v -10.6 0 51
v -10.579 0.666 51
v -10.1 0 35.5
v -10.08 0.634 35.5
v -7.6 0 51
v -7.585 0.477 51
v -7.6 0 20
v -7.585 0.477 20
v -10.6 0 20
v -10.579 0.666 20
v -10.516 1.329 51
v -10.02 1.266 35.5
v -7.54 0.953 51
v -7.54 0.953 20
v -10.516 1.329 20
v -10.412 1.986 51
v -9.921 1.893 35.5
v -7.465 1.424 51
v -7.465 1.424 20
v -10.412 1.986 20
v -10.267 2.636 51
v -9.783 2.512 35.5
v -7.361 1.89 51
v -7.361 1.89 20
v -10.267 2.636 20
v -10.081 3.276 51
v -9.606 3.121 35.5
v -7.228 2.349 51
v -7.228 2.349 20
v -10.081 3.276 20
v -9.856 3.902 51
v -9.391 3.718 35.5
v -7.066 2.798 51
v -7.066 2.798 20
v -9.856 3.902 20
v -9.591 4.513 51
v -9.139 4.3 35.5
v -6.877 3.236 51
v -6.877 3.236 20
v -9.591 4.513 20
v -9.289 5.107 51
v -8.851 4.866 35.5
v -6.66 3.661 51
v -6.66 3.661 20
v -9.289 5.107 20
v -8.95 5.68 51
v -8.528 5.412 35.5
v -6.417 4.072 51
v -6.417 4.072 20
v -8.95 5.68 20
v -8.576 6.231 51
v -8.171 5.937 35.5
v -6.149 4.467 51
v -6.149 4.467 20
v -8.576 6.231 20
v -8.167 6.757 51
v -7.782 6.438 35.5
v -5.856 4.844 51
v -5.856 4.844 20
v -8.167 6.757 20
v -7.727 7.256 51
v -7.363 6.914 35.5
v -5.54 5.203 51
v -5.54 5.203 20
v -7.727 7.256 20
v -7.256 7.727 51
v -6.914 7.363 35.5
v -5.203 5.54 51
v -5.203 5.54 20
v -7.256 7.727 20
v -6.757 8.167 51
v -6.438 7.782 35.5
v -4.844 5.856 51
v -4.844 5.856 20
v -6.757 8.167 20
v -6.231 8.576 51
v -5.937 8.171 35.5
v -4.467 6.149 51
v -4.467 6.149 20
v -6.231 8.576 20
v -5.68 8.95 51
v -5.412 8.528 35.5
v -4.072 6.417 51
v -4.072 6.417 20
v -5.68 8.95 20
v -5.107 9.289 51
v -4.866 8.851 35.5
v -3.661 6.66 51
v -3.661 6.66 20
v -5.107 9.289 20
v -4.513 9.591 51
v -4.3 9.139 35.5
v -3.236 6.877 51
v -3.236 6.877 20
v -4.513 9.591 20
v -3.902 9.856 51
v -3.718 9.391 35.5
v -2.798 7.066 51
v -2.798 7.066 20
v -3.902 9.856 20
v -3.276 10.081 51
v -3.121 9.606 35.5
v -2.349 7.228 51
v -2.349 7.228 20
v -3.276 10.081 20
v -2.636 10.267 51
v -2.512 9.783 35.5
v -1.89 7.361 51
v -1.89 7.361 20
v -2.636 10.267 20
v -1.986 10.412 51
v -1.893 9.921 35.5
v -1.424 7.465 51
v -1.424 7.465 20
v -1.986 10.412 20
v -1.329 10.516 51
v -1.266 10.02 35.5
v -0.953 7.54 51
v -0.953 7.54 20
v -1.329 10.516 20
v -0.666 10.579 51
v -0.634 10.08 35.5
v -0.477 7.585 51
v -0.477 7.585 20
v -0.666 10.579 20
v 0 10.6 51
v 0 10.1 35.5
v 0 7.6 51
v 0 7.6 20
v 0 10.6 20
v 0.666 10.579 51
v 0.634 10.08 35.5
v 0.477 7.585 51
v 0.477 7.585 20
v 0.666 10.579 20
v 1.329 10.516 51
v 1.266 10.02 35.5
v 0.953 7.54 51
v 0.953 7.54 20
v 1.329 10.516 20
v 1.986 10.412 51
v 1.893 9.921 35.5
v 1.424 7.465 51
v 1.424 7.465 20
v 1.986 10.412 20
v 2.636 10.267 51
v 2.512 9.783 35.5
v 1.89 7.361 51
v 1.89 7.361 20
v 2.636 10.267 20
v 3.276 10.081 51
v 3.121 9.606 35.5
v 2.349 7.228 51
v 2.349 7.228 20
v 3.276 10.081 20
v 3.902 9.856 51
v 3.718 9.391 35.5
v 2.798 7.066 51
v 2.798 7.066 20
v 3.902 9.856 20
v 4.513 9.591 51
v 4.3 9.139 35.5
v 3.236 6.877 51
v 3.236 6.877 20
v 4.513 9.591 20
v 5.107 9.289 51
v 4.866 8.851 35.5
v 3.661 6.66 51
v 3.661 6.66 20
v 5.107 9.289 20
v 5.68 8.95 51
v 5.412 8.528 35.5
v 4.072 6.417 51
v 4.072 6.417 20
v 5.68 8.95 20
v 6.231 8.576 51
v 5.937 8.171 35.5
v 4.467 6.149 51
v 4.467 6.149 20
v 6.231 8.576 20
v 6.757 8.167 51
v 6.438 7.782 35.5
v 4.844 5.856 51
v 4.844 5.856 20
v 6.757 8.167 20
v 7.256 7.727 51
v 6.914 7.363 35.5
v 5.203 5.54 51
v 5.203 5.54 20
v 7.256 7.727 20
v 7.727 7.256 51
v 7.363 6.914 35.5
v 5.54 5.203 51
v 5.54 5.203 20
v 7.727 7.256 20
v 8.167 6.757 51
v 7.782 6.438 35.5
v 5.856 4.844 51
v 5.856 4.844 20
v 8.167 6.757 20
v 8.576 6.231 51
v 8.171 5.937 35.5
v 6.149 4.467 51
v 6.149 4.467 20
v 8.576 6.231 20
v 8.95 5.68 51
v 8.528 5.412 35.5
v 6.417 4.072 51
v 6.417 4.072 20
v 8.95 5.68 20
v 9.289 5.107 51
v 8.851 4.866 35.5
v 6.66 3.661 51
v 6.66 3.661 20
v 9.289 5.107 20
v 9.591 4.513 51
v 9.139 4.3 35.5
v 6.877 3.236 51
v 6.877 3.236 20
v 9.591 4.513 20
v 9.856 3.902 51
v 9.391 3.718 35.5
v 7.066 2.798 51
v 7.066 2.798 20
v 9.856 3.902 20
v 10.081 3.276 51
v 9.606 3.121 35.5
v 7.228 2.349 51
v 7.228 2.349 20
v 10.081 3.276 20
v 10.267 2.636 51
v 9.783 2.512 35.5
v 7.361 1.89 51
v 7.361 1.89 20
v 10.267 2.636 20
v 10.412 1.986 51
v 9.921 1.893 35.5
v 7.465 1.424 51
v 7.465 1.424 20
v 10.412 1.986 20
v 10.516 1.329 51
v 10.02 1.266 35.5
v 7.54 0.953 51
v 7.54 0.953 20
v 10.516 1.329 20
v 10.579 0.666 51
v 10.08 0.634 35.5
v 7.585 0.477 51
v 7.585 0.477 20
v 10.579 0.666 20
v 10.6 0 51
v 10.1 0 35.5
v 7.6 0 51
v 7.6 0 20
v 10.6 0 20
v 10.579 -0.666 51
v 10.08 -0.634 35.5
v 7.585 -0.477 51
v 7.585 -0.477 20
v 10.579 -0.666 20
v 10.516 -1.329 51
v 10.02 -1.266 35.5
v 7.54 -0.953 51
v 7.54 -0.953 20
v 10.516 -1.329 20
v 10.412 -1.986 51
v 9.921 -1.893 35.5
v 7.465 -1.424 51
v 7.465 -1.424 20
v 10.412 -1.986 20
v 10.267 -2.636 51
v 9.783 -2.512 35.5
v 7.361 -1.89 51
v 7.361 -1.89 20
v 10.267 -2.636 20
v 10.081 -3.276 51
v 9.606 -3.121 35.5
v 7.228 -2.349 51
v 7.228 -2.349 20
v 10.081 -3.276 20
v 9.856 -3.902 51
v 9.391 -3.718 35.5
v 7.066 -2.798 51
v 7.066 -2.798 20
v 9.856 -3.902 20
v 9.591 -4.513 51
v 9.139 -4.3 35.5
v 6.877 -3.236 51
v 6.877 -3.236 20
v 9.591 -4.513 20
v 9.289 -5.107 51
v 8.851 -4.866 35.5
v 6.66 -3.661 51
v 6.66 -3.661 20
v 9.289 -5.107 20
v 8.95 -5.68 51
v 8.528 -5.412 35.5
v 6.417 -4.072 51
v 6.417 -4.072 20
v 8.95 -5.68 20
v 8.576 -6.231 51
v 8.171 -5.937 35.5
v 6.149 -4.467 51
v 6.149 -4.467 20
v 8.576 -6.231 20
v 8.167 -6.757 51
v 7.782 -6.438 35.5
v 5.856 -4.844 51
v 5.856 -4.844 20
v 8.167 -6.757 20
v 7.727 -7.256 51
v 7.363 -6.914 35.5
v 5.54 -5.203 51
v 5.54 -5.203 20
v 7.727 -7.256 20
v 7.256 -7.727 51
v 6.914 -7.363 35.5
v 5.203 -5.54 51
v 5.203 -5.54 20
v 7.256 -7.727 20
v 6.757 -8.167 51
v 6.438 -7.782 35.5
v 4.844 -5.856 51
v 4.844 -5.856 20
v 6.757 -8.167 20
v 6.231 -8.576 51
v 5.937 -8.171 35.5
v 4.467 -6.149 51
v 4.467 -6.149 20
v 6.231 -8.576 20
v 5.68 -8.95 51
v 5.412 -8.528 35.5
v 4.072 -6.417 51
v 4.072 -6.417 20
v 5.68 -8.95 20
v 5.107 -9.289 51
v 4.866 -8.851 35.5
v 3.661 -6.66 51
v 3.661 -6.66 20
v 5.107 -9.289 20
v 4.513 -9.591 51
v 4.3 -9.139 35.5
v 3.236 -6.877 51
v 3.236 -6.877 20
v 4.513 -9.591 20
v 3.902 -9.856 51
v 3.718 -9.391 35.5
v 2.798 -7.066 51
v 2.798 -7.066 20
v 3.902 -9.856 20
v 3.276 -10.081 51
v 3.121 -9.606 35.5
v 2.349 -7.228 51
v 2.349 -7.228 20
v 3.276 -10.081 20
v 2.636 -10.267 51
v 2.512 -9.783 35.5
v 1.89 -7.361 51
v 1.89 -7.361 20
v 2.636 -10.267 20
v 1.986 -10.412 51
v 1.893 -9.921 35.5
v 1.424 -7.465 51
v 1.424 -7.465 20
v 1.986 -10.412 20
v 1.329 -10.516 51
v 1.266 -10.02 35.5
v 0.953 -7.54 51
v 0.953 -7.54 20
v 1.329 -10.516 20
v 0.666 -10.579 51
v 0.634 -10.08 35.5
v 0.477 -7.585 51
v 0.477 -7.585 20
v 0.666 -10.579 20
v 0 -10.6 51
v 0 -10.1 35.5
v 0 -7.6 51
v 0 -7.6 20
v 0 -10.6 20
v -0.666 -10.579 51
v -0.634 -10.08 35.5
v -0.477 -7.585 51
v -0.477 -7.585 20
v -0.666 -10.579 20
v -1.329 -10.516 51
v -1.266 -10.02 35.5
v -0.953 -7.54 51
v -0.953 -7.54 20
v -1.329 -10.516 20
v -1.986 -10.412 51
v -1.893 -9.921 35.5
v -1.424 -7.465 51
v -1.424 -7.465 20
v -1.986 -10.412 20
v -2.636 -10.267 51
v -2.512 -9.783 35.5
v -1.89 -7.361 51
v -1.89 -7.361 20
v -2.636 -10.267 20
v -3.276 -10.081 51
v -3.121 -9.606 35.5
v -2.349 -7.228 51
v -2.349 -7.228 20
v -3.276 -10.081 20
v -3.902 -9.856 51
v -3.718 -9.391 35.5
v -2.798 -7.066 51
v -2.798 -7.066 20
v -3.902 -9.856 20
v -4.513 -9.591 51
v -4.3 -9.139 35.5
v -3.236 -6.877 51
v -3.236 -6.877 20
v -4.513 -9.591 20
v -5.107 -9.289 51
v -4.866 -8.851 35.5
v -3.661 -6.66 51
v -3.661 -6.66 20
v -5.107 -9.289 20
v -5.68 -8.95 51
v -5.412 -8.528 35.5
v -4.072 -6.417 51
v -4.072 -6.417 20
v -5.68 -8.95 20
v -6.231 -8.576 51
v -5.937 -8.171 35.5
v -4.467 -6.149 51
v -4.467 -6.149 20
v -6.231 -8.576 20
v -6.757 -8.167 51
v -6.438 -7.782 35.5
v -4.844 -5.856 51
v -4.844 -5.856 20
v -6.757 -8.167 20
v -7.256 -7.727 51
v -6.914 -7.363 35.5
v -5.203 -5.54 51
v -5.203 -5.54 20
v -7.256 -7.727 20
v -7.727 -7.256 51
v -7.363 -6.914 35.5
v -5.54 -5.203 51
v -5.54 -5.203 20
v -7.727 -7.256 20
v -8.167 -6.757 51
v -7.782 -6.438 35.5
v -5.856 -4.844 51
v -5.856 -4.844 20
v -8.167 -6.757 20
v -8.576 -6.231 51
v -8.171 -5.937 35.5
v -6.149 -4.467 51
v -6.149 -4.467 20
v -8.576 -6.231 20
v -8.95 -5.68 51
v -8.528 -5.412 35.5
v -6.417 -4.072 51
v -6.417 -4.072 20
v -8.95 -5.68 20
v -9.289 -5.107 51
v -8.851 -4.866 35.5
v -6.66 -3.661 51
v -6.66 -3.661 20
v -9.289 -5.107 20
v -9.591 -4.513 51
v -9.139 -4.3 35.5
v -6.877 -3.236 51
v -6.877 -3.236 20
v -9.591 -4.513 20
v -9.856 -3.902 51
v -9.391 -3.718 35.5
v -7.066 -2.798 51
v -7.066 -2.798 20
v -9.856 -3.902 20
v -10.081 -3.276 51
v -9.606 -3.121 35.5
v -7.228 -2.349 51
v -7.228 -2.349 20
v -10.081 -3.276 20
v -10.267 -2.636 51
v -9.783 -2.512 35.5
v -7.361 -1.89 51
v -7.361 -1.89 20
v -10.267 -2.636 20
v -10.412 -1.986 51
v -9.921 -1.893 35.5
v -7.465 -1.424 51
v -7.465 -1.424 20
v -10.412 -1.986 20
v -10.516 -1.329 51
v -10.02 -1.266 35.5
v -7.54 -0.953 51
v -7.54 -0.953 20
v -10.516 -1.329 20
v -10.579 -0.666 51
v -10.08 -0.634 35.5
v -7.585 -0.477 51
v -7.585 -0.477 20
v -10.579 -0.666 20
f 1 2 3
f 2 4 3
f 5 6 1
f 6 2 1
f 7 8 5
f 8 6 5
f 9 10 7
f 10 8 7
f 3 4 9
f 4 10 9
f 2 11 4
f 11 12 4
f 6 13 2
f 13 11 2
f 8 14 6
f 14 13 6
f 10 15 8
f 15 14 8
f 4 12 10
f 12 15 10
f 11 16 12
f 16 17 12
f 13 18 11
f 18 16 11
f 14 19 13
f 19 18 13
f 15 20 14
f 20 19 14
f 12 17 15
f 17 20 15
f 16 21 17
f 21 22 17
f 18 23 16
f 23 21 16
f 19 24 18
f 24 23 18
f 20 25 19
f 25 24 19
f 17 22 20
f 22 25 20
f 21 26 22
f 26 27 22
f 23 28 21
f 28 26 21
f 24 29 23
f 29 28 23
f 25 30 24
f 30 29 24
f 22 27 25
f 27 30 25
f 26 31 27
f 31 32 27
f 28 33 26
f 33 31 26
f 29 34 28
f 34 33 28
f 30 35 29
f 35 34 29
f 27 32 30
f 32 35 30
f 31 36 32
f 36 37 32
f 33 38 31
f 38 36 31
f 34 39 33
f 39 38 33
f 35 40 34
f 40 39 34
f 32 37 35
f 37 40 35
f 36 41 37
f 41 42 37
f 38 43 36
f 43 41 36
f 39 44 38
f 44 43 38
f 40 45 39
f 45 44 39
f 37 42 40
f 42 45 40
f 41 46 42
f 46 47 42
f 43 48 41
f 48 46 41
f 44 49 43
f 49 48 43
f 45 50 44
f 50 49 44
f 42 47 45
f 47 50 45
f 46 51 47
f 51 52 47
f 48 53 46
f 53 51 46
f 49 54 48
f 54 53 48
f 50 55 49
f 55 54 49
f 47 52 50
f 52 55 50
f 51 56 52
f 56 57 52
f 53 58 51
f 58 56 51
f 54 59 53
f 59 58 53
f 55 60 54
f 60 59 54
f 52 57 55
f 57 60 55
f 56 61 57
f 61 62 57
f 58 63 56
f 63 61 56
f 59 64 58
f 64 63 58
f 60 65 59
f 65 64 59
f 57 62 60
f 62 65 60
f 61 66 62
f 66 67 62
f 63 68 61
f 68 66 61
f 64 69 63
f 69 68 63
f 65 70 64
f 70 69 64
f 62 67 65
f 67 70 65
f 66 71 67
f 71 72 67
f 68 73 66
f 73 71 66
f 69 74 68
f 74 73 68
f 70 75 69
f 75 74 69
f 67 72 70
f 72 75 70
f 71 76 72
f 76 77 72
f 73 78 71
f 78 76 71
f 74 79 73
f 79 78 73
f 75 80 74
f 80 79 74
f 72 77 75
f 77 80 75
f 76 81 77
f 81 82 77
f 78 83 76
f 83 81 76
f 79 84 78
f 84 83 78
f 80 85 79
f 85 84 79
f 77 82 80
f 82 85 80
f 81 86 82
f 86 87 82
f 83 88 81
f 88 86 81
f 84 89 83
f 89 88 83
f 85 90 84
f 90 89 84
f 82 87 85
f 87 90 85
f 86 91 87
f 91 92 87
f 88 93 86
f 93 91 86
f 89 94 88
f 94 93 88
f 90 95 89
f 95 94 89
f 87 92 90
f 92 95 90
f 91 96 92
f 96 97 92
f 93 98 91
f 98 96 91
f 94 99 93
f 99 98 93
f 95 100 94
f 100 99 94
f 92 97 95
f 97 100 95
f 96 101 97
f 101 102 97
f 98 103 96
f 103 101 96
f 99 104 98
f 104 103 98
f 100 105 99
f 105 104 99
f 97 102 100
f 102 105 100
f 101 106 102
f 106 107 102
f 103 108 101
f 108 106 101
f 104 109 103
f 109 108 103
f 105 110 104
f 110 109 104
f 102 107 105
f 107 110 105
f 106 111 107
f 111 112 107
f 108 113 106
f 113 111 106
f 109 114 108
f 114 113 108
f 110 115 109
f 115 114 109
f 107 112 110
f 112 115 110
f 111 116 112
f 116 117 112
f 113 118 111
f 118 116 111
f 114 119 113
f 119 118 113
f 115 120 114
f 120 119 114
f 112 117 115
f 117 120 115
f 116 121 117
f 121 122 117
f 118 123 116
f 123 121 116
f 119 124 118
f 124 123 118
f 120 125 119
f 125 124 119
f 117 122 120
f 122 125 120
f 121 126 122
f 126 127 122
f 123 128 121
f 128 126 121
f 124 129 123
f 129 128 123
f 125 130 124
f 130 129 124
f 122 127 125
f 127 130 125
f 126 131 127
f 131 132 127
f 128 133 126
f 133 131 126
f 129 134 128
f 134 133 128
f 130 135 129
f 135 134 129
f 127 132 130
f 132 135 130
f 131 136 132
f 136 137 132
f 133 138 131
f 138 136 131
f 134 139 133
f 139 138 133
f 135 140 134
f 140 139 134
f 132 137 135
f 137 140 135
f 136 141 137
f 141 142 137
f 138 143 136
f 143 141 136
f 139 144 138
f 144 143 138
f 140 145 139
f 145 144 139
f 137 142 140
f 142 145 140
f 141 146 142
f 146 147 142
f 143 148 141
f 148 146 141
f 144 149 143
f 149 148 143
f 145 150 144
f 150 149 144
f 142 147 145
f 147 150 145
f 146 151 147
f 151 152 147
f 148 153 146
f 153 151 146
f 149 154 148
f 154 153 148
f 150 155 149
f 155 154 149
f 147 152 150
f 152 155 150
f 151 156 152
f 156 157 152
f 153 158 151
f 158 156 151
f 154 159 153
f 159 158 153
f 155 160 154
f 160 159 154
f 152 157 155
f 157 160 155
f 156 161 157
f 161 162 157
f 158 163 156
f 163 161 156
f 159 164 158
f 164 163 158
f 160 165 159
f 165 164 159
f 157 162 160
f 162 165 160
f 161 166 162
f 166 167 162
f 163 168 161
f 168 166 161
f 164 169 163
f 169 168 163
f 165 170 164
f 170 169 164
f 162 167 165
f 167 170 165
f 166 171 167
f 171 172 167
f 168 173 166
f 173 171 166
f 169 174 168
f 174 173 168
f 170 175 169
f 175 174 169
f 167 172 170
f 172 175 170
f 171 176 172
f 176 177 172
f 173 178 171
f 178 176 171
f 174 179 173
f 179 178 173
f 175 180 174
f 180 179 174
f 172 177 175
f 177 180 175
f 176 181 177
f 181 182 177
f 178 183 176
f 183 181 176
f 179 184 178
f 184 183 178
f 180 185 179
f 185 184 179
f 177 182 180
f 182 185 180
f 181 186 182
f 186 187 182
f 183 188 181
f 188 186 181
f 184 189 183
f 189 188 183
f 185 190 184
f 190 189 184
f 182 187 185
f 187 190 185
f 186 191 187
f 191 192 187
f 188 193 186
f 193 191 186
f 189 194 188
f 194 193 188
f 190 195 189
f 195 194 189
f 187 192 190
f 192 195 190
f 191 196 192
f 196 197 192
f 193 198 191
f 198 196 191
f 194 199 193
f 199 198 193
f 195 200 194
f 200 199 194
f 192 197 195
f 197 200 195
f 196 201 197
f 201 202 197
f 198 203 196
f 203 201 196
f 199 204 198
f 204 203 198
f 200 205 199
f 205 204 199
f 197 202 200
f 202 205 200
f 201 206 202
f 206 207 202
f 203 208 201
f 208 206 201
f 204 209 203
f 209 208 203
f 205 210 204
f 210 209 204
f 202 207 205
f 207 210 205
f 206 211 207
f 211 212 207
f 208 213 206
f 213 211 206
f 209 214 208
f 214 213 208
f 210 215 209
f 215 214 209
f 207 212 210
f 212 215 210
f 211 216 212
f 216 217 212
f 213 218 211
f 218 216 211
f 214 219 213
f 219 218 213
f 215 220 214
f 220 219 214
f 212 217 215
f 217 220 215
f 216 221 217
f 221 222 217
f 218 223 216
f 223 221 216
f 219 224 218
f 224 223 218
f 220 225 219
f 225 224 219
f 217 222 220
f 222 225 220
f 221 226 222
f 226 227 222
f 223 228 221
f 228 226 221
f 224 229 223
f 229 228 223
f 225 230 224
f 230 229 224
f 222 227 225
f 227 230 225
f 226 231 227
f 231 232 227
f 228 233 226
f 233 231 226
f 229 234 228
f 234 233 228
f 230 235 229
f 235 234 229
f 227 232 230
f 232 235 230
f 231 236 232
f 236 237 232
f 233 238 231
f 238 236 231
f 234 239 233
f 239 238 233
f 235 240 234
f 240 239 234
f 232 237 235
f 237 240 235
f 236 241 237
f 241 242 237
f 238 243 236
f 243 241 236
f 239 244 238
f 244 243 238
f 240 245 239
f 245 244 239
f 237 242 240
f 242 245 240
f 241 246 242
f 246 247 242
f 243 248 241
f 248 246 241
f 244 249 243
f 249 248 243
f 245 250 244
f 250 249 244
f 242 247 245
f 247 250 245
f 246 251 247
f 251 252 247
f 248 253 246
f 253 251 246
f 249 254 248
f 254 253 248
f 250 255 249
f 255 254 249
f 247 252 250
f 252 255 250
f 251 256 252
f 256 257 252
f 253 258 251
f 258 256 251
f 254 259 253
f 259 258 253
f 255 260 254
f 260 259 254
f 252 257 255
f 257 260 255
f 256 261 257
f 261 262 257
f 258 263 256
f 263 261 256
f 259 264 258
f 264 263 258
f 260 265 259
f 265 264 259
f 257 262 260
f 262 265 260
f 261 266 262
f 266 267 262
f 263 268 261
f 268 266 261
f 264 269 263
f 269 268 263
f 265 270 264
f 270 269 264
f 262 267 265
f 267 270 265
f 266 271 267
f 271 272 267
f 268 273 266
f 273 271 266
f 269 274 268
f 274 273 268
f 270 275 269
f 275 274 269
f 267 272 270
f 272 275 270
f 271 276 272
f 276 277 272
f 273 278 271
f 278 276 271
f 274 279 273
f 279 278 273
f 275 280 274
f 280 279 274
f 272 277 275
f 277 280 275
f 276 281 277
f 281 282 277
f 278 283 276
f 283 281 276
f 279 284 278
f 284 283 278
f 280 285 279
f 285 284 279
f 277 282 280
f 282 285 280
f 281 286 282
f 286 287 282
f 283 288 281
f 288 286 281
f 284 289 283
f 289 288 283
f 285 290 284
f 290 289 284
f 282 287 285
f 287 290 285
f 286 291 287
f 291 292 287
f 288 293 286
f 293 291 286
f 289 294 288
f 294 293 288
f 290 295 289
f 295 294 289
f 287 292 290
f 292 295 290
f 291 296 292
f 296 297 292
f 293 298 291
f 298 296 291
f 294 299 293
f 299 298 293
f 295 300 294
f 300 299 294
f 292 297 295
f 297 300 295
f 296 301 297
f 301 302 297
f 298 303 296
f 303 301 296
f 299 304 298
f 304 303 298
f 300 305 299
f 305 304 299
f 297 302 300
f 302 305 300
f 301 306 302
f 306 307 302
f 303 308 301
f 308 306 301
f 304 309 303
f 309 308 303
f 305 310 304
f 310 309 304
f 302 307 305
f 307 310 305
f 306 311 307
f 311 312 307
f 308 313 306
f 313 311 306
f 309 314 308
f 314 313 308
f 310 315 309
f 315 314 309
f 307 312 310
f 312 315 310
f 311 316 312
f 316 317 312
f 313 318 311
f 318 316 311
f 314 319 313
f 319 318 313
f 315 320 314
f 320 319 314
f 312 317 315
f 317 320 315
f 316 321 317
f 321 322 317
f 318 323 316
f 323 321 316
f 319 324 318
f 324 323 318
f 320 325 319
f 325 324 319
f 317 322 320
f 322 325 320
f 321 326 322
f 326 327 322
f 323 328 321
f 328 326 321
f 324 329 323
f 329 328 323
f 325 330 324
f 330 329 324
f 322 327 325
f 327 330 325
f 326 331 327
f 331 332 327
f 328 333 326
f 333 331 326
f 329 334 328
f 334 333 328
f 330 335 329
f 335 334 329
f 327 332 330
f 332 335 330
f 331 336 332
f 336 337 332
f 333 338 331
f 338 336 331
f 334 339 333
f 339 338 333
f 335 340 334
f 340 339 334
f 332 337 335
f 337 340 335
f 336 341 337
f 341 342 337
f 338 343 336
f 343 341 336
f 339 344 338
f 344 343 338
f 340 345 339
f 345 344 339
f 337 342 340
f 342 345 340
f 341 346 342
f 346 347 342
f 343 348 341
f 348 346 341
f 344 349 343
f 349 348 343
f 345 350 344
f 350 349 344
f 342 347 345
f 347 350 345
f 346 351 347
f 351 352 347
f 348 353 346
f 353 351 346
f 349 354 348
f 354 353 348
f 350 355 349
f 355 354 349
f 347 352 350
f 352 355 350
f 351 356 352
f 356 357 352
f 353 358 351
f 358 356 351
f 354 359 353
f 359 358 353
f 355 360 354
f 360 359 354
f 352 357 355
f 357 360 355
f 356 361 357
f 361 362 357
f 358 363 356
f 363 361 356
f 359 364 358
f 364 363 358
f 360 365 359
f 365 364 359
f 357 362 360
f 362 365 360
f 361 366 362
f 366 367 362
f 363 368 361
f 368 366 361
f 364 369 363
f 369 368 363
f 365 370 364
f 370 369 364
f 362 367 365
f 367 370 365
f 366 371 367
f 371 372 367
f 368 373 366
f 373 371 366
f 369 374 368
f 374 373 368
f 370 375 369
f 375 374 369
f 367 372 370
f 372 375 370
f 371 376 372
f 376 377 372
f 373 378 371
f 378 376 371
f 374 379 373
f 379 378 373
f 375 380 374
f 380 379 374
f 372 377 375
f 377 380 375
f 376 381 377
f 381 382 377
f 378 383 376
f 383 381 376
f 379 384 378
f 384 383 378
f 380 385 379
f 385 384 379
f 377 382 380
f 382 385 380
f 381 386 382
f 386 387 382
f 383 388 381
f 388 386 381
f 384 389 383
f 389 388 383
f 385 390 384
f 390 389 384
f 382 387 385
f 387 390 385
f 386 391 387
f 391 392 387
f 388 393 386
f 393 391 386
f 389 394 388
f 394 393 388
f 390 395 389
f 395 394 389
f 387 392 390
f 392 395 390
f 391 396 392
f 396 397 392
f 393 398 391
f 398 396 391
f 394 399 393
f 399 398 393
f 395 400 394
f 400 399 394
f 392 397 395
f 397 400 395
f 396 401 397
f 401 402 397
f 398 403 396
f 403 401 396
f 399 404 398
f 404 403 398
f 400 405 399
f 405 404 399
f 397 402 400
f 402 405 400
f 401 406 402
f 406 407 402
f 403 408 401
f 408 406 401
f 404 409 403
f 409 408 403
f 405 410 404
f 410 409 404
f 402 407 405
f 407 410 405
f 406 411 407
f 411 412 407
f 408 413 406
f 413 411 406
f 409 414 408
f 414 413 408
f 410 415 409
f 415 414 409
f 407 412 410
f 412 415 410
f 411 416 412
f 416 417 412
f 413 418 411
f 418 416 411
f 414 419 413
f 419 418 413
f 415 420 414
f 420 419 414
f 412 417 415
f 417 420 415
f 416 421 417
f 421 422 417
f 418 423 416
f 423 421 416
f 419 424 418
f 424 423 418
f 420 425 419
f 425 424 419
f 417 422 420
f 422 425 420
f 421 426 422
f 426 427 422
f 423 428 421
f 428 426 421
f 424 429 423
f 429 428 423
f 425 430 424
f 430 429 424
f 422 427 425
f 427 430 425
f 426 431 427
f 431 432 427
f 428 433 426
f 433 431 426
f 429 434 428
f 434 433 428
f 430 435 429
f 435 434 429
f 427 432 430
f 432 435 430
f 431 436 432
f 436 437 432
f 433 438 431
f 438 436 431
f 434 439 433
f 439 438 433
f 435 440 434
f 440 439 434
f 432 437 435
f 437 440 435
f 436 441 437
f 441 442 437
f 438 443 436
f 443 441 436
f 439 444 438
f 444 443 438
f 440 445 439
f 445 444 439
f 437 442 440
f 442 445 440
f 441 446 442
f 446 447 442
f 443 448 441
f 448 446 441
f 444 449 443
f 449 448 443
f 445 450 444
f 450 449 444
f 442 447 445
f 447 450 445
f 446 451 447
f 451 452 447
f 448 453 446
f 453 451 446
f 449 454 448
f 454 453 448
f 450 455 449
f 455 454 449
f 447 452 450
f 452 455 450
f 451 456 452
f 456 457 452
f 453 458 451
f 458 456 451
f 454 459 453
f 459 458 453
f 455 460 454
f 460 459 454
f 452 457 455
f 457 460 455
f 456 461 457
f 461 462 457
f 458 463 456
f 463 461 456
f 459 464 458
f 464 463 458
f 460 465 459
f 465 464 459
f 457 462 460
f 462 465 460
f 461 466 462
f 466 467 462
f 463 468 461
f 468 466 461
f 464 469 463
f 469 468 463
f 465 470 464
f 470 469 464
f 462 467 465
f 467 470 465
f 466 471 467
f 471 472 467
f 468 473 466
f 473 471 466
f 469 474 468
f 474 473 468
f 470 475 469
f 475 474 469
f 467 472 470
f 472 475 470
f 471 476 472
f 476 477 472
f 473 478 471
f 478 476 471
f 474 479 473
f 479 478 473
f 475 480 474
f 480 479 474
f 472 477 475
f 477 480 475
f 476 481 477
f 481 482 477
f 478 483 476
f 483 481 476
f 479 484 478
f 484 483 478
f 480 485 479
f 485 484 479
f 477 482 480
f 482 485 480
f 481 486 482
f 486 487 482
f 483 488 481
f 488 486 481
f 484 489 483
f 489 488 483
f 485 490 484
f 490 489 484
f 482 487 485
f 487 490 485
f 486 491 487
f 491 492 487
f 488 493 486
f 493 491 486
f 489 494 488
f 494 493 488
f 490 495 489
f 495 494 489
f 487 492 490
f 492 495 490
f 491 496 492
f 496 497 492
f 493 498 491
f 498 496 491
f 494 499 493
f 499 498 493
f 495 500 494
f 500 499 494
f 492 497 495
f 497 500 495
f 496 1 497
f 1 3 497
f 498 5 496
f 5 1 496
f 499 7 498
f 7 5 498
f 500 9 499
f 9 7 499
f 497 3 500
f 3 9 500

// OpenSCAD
$fn=100;

axisIntervalY = 100;
axisIntervalX = 78;
wheelMiddleWidth = 40;
rackWidth= 3;
rotate([0,0,90]) fixed(); 
cap();
crane();
translate([100,0,115]) {
    rotate([90,0,0]){ 
        //translate([0,0,-68/2])  rotate_extrude() translate([58/2,0]) square([70,68],center=false);            
        //translate([55,-95,0]) cylinder(d=20,h=90,center=true);
        //translate([-55,-95,0]) cylinder(d=20,h=90,center=true);
        translate([0,-95,0]){
            //translate([0,0,axisIntervalX/2-rackWidth/2]) rack();
            //translate([0,0,-(axisIntervalX/2-rackWidth/2)]) rack();
            translate([0,5,0]){
                translate([axisIntervalY/2,0,0]) {
                    axis(m=-24);
                    translate([0,0,0]) !wheel(m=-15);
                }
                translate([-axisIntervalY/2,0,0]) {
                    axis(m=14);
                    translate([0,0,0]) wheel(m=4);
                }
            }            
        }       
    }    
    translate([0,0,-110]) base();
    //translate([0,0,-95]) cube([120,20,20],center=true);
}
module crane(){
    difference(){
        translate([0,0,0]) linear_extrude(10)  polygon([[0,0],[18,0],[20,2],[20,58],[22,60],[58,55],[60,56.5],[60,58],[58,60],[18,65],[16,63],[16,5],[14,3],[0,3]]);
        translate([10,0,5]) rotate([90,0,0]) cylinder(d=3.5,h=20,center=true);
    }
}
module cap(){
    translate([0,0,-2]) difference(){
        rotate_extrude() translate([0,0]) square([34,2]); 
        translate([20,0,0]) cylinder(d=4.5,h=10,center=true);
    }
    translate([0,0,0]) rotate_extrude() translate([30,0]) polygon([[0,0],[1.5,0],[1.5,6],[1.8,7],[1.8,8],[1.5,9],[0,9]]);
}
module baseFix(){
    difference(){
        hull(){
            translate([0,0,0]) cube([15,wheelMiddleWidth,1],center=true);
            translate([0,0,20]) cube([25,wheelMiddleWidth,1],center=true);
            
        }
        translate([0,0,10]) cube([26,wheelMiddleWidth-10,22],center=true);
        translate([0,0,18]) rotate([90,0,0]) cylinder(d=15,h=wheelMiddleWidth,center=true);
    }
    
}
module base(){
    translate([0,0,1]) difference(){
        cube([axisIntervalY,wheelMiddleWidth,3],center=true);
        cube([axisIntervalY-20,wheelMiddleWidth-15,4],center=true);
    }
    translate([axisIntervalY/2,0,0]) baseFix();
    rotate([0,0,180]) translate([axisIntervalY/2,0,0]) baseFix();
    
}
module fixed(){
    // cube([90,240,20],center=true);

    difference(){
    
        translate([0,122.5,15]) {
            translate([0,-20,-10]){ 
                translate([0,5,7]) minkowski(){
                    cube([110,24.4,25],center=true);
                    cylinder(d=8,h=1,center=true);
                }
                translate([0,0,18]) hull(){
                    translate([0,30,0]) cylinder(d=30,h=4,center=true);
                    cylinder(d=100,h=4,center=true);
                }
            
            }
            /*
            translate([18,0,0])  hull(){
                translate([2.5,0,0]) cylinder(d=4.4,h=25,center=false);
                translate([-2.5,0,0]) cylinder(d=4.4,h=25,center=false);
            }
            translate([-18,0,0])  hull(){
                translate([2.5,0,0]) cylinder(d=4.4,h=25,center=false);
                translate([-2.5,0,0]) cylinder(d=4.4,h=25,center=false);
            }
            */
            
        }
        translate([0,132,0]){
            cylinder(d=5.5,h=100,center=true);
            translate([0,13,0]) cylinder(d=5.5,h=100,center=true);
        }
        translate([0,105,5]) rotate([0,90,0]) cylinder(d=10,h=150,center=true);
        minkowski(){
            cube([110-10,240-10,50],center=true);
            cylinder(d=10,h=1,center=true);
        }
    }

}


module rack(){
    difference(){
        minkowski(){
            cube([axisIntervalY,10,rackWidth-1],center=true);
            cylinder(d=20,h=1,center=true);
        }
        translate([0,5,0]){
            translate([axisIntervalY/2,0,0]) cylinder(d=15,h=10,center=true);
            translate([-axisIntervalY/2,0,0]) cylinder(d=15,h=10,center=true);
        }
        //translate([0,-7,0]) #cube([20,4,6],center=true);
    }  
}
module axis(m = 20){
    translate([0,0,0]) difference(){
        union(){
           cylinder(d=16,h=wheelMiddleWidth-1-10,center=true);
           translate([0,0,wheelMiddleWidth/2-5]) cylinder(d1=16,d2=14.5,h=1,center=true);
           translate([0,0,-(wheelMiddleWidth/2-5)]) cylinder(d2=16,d1=14.5,h=1,center=true);
           cylinder(d2=16,d1=14.5,h=1,center=true);
           cylinder(d=14.5,h=axisIntervalX-m,center=true);
        }
        translate([13,0,0]) cube([16,16,axisIntervalX-m],center=true);
    
    }
}
module wheel(m=0){
    w = ((axisIntervalX-wheelMiddleWidth-rackWidth*2)/2-m)/2;
    translate([0,0,wheelMiddleWidth/2+w]) rotate_extrude() translate([7.6,0]) {
        //square([2.5,10]);
        polygon([[0,-w],[3,-w],[2.5,0],[3,w],[0,w]]);
    }
}
